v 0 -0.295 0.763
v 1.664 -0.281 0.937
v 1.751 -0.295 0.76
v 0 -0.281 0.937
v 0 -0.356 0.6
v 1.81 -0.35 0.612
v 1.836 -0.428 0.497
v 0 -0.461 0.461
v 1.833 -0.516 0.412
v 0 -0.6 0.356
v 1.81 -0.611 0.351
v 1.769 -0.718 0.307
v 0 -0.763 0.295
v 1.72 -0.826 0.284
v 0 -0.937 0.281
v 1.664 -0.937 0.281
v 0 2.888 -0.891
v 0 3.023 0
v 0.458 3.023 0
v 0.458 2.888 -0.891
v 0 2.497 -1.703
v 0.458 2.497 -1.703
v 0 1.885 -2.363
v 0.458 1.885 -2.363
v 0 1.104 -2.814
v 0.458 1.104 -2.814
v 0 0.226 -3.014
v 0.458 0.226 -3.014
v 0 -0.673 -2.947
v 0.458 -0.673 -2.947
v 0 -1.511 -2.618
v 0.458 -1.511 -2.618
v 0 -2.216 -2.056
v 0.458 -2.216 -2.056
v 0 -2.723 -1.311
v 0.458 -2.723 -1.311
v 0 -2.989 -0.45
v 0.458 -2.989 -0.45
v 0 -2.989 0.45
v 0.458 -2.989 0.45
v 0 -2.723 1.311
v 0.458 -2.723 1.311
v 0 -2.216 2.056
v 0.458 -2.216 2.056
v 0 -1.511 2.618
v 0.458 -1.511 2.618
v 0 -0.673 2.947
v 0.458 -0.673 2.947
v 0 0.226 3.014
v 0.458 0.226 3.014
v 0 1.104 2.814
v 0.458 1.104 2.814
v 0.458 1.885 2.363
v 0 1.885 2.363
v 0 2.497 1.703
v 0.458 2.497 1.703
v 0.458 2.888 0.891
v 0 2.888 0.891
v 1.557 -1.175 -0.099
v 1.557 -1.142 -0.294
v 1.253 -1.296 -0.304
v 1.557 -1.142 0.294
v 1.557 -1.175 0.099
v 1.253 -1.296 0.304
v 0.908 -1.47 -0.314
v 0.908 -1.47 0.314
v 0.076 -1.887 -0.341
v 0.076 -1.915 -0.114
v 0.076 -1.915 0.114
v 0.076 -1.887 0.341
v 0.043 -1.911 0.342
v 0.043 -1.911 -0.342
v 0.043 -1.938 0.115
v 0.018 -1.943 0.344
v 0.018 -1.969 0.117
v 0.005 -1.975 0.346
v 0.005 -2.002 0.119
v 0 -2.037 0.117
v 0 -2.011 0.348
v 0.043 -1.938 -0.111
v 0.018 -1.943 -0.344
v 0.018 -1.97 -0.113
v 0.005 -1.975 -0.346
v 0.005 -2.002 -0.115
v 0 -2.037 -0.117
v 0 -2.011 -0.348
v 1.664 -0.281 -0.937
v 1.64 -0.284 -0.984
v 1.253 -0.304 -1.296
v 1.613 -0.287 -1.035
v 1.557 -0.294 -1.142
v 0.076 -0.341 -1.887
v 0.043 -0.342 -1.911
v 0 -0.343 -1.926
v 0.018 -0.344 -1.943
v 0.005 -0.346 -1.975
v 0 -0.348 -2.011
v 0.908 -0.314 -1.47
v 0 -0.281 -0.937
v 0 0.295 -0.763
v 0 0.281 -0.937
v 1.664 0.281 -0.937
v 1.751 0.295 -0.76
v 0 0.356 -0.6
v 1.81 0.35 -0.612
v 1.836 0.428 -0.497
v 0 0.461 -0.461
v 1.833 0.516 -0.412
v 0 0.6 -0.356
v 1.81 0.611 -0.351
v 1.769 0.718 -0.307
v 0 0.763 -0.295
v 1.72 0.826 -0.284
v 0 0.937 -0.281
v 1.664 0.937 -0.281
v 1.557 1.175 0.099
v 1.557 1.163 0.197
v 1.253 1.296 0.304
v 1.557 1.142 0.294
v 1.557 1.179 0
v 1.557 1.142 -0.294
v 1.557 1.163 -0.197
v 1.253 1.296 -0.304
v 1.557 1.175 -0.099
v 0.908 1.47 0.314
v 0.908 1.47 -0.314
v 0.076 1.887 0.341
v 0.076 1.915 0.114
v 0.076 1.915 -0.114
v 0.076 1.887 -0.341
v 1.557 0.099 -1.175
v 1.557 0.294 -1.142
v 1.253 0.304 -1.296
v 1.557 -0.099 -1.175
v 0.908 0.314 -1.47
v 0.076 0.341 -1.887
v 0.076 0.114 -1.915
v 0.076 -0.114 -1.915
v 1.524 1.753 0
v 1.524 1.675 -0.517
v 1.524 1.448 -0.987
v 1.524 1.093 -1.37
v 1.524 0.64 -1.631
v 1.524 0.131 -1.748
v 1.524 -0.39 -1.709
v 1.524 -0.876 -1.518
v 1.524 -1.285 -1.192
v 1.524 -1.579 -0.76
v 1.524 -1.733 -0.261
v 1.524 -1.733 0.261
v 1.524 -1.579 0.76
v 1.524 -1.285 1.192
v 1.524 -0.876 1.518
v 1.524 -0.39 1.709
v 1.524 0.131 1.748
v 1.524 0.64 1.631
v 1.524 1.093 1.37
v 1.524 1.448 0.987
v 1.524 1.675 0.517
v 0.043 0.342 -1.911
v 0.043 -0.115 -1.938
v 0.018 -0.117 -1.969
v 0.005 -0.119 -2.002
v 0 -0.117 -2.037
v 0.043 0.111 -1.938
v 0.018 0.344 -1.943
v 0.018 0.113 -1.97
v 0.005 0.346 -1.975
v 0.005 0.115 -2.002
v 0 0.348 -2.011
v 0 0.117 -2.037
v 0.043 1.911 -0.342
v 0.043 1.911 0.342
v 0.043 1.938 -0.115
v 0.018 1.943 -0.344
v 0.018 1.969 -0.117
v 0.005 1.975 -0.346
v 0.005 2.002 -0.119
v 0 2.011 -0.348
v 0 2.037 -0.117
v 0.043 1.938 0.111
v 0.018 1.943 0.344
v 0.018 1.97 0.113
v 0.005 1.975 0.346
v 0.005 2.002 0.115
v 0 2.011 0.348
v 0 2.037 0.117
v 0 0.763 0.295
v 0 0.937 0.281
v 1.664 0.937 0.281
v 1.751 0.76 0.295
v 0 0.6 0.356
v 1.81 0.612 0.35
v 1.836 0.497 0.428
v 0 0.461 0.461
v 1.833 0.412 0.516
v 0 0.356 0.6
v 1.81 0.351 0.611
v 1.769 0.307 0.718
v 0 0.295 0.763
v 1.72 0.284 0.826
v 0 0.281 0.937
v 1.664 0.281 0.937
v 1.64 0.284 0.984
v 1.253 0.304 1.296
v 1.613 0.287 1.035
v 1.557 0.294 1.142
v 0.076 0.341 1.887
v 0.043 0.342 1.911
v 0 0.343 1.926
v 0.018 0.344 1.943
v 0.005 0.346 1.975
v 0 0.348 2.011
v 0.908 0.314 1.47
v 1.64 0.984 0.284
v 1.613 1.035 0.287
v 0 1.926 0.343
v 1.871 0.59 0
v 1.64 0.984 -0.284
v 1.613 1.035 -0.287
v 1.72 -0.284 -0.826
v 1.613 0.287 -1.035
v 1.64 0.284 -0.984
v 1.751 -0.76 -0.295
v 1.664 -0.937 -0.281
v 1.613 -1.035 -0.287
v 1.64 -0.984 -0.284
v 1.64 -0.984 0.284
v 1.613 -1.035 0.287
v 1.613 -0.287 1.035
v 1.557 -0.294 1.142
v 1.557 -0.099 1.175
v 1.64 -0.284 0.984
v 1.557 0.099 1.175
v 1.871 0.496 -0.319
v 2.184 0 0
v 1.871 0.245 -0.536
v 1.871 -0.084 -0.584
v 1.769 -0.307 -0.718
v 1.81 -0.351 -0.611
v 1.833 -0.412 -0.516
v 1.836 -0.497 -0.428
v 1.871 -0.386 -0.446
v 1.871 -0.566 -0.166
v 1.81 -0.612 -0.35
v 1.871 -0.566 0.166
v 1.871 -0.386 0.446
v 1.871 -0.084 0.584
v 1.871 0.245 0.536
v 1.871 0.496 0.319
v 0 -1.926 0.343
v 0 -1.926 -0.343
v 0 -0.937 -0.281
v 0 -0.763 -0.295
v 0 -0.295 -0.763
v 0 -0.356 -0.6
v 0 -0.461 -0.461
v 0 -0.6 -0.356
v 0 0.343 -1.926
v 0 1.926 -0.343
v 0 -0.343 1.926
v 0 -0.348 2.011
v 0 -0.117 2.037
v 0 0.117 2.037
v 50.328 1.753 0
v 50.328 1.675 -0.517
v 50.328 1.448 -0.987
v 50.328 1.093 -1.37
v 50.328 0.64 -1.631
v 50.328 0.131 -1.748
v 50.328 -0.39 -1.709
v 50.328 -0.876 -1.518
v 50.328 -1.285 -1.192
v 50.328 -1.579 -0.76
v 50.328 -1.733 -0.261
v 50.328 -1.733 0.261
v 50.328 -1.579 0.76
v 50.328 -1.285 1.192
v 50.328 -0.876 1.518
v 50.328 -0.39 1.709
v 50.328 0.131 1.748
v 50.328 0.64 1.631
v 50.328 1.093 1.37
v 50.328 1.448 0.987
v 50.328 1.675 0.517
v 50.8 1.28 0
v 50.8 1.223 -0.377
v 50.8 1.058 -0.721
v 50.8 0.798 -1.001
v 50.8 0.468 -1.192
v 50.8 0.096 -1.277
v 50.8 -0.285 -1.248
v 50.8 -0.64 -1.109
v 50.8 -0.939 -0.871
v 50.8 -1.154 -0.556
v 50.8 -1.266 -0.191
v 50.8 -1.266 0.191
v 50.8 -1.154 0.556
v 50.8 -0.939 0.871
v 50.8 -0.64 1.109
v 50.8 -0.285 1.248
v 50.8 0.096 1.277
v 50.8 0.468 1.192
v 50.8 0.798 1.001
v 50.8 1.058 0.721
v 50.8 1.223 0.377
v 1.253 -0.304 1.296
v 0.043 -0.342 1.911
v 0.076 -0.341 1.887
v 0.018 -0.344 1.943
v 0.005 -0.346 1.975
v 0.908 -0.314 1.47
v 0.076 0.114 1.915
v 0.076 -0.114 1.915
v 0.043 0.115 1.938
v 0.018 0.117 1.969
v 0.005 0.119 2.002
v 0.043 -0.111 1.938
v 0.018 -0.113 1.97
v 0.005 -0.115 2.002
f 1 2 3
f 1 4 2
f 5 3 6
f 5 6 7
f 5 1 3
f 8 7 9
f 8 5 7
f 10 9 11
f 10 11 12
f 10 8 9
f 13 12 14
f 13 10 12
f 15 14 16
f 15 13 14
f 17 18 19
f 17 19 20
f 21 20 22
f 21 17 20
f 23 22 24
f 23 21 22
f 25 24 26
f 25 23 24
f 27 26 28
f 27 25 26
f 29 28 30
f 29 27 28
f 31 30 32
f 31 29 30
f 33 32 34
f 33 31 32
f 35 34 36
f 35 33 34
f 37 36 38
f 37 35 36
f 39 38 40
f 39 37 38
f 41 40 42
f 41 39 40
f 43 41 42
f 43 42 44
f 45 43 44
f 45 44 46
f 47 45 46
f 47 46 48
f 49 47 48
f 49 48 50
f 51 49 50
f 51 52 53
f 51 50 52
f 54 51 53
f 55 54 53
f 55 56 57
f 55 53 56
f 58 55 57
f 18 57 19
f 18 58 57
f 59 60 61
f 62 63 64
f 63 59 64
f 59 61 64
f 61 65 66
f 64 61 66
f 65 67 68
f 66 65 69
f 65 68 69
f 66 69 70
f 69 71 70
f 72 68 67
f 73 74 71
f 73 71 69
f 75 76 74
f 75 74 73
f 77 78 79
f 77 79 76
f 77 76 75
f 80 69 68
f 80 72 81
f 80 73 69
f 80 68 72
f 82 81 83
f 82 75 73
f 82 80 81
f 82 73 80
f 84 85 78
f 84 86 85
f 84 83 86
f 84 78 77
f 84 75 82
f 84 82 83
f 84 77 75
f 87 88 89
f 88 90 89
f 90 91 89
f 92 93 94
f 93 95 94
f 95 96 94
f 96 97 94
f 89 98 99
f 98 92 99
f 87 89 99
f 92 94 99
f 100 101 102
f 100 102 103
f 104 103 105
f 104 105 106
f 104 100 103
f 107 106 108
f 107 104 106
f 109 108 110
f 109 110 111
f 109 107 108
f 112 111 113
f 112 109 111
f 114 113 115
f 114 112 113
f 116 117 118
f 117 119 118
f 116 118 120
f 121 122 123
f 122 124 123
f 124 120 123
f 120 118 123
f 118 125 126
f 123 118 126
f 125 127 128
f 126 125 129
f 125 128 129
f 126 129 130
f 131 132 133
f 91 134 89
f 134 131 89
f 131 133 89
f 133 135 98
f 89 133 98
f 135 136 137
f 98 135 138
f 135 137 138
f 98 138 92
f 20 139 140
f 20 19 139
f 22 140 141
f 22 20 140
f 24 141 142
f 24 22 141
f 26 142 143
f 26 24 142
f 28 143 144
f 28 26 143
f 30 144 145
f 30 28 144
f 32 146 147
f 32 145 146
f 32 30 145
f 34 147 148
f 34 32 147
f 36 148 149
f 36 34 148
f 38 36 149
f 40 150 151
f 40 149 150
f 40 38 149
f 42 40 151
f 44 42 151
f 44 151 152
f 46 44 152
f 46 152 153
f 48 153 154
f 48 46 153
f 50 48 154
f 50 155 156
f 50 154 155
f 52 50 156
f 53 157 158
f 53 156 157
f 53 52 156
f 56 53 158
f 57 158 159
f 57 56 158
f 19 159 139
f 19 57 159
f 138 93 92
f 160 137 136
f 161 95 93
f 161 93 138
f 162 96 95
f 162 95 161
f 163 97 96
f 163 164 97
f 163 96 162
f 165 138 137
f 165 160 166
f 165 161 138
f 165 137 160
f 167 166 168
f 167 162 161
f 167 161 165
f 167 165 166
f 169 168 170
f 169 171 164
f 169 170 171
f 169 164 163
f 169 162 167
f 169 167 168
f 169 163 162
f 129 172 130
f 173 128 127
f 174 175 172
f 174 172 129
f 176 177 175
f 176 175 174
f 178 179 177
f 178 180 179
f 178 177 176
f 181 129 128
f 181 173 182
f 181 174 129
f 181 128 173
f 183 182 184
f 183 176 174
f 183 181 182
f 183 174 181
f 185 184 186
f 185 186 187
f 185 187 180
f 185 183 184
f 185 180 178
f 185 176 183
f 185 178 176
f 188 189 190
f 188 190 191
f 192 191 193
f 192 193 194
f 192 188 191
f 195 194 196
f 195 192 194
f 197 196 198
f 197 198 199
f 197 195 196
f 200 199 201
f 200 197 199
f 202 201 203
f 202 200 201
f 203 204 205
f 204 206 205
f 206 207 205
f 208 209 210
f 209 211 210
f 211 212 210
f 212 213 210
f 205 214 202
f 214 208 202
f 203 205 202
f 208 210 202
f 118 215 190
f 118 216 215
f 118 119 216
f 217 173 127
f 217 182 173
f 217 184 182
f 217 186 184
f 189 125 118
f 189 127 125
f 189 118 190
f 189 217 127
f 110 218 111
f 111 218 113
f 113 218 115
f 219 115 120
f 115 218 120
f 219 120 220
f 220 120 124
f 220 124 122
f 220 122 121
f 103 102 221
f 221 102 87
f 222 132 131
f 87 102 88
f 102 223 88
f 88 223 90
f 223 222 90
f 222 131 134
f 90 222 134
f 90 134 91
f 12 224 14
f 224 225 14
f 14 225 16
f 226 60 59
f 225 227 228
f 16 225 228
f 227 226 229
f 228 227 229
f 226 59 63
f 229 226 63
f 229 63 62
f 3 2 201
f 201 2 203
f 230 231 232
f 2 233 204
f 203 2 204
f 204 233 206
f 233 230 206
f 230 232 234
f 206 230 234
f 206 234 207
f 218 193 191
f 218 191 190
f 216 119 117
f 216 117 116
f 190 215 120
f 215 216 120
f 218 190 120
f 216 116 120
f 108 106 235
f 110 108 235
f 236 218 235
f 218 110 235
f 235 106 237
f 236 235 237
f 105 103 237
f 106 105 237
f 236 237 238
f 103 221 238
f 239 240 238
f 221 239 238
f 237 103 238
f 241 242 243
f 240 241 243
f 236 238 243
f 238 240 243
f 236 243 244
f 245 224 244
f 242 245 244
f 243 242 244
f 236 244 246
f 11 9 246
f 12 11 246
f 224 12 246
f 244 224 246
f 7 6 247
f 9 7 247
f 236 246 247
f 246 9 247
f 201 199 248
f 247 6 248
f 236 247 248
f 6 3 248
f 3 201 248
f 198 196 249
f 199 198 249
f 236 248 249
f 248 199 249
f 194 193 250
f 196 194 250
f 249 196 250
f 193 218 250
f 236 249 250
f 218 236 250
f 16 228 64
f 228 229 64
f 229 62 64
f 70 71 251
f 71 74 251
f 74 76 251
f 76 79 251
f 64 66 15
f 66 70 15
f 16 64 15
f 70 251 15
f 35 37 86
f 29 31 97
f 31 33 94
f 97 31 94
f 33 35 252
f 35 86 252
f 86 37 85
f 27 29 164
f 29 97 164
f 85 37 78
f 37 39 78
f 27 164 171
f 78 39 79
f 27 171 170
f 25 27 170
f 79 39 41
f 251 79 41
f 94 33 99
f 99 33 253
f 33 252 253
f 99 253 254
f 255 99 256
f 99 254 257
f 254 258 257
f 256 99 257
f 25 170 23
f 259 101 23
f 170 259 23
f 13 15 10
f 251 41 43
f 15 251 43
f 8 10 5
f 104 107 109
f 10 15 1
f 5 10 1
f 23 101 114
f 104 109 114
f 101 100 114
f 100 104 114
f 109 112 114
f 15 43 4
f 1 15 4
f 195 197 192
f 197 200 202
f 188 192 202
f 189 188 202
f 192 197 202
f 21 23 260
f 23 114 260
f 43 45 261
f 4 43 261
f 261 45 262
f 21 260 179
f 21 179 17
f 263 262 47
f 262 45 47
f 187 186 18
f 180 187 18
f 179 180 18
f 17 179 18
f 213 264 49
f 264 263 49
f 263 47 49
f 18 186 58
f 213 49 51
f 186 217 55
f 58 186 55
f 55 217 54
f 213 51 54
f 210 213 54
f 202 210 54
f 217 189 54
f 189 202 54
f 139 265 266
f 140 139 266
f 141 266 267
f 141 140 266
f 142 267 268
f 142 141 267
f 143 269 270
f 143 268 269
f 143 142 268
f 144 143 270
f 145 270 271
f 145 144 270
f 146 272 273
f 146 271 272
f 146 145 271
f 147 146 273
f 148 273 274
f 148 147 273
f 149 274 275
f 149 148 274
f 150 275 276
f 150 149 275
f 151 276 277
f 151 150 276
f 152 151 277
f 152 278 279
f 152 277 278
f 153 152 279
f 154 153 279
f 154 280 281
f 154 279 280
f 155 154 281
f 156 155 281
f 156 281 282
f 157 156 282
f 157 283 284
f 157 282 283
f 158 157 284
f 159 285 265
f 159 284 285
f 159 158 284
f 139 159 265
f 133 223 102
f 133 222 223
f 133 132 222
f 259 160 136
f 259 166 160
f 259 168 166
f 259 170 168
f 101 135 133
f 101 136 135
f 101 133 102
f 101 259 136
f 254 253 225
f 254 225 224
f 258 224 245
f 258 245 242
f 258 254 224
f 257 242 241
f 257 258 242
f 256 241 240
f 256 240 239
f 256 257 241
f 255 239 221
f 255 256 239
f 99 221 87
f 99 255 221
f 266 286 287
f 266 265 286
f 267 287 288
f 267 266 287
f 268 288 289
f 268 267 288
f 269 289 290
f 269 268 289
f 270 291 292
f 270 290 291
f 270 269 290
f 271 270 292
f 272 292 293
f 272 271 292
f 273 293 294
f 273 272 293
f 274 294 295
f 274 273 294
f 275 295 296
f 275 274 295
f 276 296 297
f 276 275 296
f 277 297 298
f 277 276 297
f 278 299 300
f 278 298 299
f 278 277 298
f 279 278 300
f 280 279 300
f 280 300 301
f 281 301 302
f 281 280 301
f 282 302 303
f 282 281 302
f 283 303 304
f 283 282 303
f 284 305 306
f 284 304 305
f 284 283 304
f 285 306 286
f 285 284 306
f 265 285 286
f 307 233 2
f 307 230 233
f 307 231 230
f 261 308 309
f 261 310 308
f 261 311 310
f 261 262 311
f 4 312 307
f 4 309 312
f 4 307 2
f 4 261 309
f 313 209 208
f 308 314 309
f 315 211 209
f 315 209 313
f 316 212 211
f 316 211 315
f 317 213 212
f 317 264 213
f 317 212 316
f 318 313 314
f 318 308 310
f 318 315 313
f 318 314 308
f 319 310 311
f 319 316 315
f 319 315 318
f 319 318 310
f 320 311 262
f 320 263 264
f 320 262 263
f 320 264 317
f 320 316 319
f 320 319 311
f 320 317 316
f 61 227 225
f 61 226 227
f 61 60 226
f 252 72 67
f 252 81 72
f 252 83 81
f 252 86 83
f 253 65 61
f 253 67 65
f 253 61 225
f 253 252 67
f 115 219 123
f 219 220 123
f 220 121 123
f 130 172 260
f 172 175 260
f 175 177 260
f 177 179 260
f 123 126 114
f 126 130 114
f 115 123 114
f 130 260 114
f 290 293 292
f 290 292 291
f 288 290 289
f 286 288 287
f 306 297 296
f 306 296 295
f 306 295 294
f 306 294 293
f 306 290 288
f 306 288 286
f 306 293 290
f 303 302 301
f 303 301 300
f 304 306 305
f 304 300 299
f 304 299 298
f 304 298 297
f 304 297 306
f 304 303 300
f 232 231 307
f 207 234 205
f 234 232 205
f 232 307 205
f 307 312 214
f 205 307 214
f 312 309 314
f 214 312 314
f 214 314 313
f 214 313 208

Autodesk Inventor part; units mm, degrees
ref_plane "YZ Plane" through (0, 0, 0) normal (1, 0, 0) x (0, 1, 0)
ref_plane "XZ Plane" through (0, 0, 0) normal (0, 1, 0) x (-1, 0, 0)
sketch "Sketch1" plane through (0, 0, 0) normal (0, 0, 1) x (1, 0, 0)
  line L0 (2.1844, 0) -> (50.8, 0)
  line L1 (50.8, 0) -> (50.8, 1.7526)
  line L2 (50.8, 1.7526) -> (1.524, 1.7526)
  line L3 (0.4583, 3.0226) -> (0, 3.0226)
  line L4 (-5.08, 0) -> (30.48, 0) projected
  line L5 (0, -0.6045) -> (0, 3.6271) projected
  line L6 (0, 1.9558) -> (1.5573, 1.1793)
  line L7 (1.5573, 1.1793) -> (2.1844, 0)
  line L8 (1.524, 1.7526) -> (0.4583, 3.0226)
  line L9 (0, 3.0226) -> (0, 1.9558)
  dimension "d2" = 3.5052
  dimension "d3" = 6.0452
  dimension "d4" = 2.1844
  dimension "d5" = 3.9116
  dimension "d6" = 26.5
  dimension "d7" = 62
  dimension "d13" = 50
  dimension "d14" = 1.524
  dimension "d15" = 50.8
revolve "Body" add sketch "Sketch1" angle 360 about axis through (2.1844, 0, 0) along (1, 0, 0) contours L7 L6 L5 L3 L8 L2 L1 L0
sketch "Sketch2" plane through (0, 0, 0) normal (-1, 0, 0) x (0, 0, 1)
  line L0 (0, -4.2316) -> (0, 4.2316) projected
  line L1 (-4.2316, 0) -> (4.2316, 0) projected
  line L2 (0, 1.9558) -> (0, 0) construction
  line L3 (0, 0) -> (1.9558, 0) construction
  arc A0 (0.6519, 0) -> (0, 0.6519) centre (0, 0) ccw
  line L4 (0, 0) -> (0.7947, 0.7947) construction
  arc A1 (0.9779, 0) -> (0, 0.9779) centre (0, 0) ccw construction
  line L5 (0.3429, 1.9255) -> (0.2811, 0.9366)
  line L6 (1.9255, 0.3429) -> (0.9366, 0.2811)
  arc A2 (0.2811, 0.9366) -> (0.9366, 0.2811) centre (0.8981, 0.8981) ccw
  arc A3 (1.9558, 0) -> (1.9255, 0.3429) centre (0, 0) ccw
  arc A4 (0.3429, 1.9255) -> (0, 1.9558) centre (0, 0) ccw
  arc A5 (1.9255, 0.3429) -> (0.3429, 1.9255) centre (0, 0) ccw
  line L7 (0.3429, -1.9255) -> (0.2811, -0.9366)
  line L8 (1.9255, -0.3429) -> (0.9366, -0.2811)
  arc A6 (0.9366, -0.2811) -> (0.2811, -0.9366) centre (0.8981, -0.8981) ccw
  arc A7 (1.9255, -0.3429) -> (1.9558, 0) centre (0, 0) ccw
  arc A8 (0, -1.9558) -> (0.3429, -1.9255) centre (0, 0) ccw
  arc A9 (0.3429, -1.9255) -> (1.9255, -0.3429) centre (0, 0) ccw
  line L9 (-0.3429, 1.9255) -> (-0.2811, 0.9366)
  line L10 (-1.9255, 0.3429) -> (-0.9366, 0.2811)
  arc A10 (-0.9366, 0.2811) -> (-0.2811, 0.9366) centre (-0.8981, 0.8981) ccw
  arc A11 (-1.9255, 0.3429) -> (-1.9558, 0) centre (0, 0) ccw
  arc A12 (0, 1.9558) -> (-0.3429, 1.9255) centre (0, 0) ccw
  arc A13 (-0.3429, 1.9255) -> (-1.9255, 0.3429) centre (0, 0) ccw
  arc A14 (-1.9255, -0.3429) -> (-0.3429, -1.9255) centre (0, 0) ccw
  arc A15 (-0.3429, -1.9255) -> (0, -1.9558) centre (0, 0) ccw
  arc A16 (-1.9558, 0) -> (-1.9255, -0.3429) centre (0, 0) ccw
  line L11 (-1.9255, -0.3429) -> (-0.9366, -0.2811)
  arc A17 (-0.2811, -0.9366) -> (-0.9366, -0.2811) centre (-0.8981, -0.8981) ccw
  line L12 (-0.3429, -1.9255) -> (-0.2811, -0.9366)
  dimension "d18" = 45
  dimension "d19" = 1.3039
  dimension "d20" = 1.9558
  dimension "d21" = 3.9116
  dimension "d22" = 0.3429
extrude "Slot" add sketch "Sketch2" against normal up to next contours A2 L5 A5 L6 | L9 A10 L10 A13 | L7 A6 L8 A9 | A14 L11 A17 L12
fillet "Fillet1" radius 0.1372 4 edges at (0, 1.9558, 0) (0, 0, 1.9558) (0, -1.9558, 0) (0, 0, -1.9558)
thread "Thread" size "6-32 UNC" class "2A" standard "ANSI Unified Screw Threads" length 19.05
chamfer "Chamfer1" distance 0.4723 distance2 0.4723 1 edges at (50.8, -1.7526, 0) measured on face at (50.8, -0.4673, -0.1398)
ref_plane "Work Plane2" through (2.032, 0, 0) normal (0, 1, 0) x (1, 0, 0)
equation "\"d2\" = GD"
equation "\"d3\" = KOD"
equation "\"d4\" = INTI"
equation "\"d5\" = SDM"
equation "\"d13\" = 0.5 * SEWI"
equation "\"d14\" = KOH"
equation "\"d19\" = 0.333333 * SDM"
equation "\"d20\" = 0.5 * SDM"
equation "\"d21\" = SDM"
equation "\"d22\" = 0.5 * SBR"
equation "\"d45\" = INTI"
equation "\"d25\" = 0.2 * SBR"
equation "\"d9\" = GEL"
equation "\"d11\" = -0.5 * SPD + 0.5 * GD"
equation "\"d12\" = GUL"
equation "\"GD\" = NND"
equation "\"NLG\" = 25.4"
equation "\"GEL\" = 19.05"
equation "\"KOD\" = 6.0452"
equation "\"KOH\" = 1.524"
equation "\"SDM\" = 3.9116"
equation "\"INTI\" = 2.1844"
equation "\"SBR\" = 0.6858"
equation "\"GUL\" = -0.5 * SPD + 0.5 * NND"
equation "\"SPD\" = 2.56064"
equation "\"SEWI\" = 100deg"
equation "\"d1\" = KOH"
equation "\"d17\" = SDM"
equation "\"TOA\" = 30deg"
equation "\"EPV\" = 2.99461"
equation "\"THREADDIA\" = 3.5052"
equation "\"BDM\" = NND"
equation "\"NND\" = 3.5052"
equation "\"GAL\" = 0.79375"
equation "\"GD1\" = SPD"
properties part number "ANSI B18.6.3 - 6-32 UNC x 1, CRFCHMSTII(2)" material "Steel, Mild"
